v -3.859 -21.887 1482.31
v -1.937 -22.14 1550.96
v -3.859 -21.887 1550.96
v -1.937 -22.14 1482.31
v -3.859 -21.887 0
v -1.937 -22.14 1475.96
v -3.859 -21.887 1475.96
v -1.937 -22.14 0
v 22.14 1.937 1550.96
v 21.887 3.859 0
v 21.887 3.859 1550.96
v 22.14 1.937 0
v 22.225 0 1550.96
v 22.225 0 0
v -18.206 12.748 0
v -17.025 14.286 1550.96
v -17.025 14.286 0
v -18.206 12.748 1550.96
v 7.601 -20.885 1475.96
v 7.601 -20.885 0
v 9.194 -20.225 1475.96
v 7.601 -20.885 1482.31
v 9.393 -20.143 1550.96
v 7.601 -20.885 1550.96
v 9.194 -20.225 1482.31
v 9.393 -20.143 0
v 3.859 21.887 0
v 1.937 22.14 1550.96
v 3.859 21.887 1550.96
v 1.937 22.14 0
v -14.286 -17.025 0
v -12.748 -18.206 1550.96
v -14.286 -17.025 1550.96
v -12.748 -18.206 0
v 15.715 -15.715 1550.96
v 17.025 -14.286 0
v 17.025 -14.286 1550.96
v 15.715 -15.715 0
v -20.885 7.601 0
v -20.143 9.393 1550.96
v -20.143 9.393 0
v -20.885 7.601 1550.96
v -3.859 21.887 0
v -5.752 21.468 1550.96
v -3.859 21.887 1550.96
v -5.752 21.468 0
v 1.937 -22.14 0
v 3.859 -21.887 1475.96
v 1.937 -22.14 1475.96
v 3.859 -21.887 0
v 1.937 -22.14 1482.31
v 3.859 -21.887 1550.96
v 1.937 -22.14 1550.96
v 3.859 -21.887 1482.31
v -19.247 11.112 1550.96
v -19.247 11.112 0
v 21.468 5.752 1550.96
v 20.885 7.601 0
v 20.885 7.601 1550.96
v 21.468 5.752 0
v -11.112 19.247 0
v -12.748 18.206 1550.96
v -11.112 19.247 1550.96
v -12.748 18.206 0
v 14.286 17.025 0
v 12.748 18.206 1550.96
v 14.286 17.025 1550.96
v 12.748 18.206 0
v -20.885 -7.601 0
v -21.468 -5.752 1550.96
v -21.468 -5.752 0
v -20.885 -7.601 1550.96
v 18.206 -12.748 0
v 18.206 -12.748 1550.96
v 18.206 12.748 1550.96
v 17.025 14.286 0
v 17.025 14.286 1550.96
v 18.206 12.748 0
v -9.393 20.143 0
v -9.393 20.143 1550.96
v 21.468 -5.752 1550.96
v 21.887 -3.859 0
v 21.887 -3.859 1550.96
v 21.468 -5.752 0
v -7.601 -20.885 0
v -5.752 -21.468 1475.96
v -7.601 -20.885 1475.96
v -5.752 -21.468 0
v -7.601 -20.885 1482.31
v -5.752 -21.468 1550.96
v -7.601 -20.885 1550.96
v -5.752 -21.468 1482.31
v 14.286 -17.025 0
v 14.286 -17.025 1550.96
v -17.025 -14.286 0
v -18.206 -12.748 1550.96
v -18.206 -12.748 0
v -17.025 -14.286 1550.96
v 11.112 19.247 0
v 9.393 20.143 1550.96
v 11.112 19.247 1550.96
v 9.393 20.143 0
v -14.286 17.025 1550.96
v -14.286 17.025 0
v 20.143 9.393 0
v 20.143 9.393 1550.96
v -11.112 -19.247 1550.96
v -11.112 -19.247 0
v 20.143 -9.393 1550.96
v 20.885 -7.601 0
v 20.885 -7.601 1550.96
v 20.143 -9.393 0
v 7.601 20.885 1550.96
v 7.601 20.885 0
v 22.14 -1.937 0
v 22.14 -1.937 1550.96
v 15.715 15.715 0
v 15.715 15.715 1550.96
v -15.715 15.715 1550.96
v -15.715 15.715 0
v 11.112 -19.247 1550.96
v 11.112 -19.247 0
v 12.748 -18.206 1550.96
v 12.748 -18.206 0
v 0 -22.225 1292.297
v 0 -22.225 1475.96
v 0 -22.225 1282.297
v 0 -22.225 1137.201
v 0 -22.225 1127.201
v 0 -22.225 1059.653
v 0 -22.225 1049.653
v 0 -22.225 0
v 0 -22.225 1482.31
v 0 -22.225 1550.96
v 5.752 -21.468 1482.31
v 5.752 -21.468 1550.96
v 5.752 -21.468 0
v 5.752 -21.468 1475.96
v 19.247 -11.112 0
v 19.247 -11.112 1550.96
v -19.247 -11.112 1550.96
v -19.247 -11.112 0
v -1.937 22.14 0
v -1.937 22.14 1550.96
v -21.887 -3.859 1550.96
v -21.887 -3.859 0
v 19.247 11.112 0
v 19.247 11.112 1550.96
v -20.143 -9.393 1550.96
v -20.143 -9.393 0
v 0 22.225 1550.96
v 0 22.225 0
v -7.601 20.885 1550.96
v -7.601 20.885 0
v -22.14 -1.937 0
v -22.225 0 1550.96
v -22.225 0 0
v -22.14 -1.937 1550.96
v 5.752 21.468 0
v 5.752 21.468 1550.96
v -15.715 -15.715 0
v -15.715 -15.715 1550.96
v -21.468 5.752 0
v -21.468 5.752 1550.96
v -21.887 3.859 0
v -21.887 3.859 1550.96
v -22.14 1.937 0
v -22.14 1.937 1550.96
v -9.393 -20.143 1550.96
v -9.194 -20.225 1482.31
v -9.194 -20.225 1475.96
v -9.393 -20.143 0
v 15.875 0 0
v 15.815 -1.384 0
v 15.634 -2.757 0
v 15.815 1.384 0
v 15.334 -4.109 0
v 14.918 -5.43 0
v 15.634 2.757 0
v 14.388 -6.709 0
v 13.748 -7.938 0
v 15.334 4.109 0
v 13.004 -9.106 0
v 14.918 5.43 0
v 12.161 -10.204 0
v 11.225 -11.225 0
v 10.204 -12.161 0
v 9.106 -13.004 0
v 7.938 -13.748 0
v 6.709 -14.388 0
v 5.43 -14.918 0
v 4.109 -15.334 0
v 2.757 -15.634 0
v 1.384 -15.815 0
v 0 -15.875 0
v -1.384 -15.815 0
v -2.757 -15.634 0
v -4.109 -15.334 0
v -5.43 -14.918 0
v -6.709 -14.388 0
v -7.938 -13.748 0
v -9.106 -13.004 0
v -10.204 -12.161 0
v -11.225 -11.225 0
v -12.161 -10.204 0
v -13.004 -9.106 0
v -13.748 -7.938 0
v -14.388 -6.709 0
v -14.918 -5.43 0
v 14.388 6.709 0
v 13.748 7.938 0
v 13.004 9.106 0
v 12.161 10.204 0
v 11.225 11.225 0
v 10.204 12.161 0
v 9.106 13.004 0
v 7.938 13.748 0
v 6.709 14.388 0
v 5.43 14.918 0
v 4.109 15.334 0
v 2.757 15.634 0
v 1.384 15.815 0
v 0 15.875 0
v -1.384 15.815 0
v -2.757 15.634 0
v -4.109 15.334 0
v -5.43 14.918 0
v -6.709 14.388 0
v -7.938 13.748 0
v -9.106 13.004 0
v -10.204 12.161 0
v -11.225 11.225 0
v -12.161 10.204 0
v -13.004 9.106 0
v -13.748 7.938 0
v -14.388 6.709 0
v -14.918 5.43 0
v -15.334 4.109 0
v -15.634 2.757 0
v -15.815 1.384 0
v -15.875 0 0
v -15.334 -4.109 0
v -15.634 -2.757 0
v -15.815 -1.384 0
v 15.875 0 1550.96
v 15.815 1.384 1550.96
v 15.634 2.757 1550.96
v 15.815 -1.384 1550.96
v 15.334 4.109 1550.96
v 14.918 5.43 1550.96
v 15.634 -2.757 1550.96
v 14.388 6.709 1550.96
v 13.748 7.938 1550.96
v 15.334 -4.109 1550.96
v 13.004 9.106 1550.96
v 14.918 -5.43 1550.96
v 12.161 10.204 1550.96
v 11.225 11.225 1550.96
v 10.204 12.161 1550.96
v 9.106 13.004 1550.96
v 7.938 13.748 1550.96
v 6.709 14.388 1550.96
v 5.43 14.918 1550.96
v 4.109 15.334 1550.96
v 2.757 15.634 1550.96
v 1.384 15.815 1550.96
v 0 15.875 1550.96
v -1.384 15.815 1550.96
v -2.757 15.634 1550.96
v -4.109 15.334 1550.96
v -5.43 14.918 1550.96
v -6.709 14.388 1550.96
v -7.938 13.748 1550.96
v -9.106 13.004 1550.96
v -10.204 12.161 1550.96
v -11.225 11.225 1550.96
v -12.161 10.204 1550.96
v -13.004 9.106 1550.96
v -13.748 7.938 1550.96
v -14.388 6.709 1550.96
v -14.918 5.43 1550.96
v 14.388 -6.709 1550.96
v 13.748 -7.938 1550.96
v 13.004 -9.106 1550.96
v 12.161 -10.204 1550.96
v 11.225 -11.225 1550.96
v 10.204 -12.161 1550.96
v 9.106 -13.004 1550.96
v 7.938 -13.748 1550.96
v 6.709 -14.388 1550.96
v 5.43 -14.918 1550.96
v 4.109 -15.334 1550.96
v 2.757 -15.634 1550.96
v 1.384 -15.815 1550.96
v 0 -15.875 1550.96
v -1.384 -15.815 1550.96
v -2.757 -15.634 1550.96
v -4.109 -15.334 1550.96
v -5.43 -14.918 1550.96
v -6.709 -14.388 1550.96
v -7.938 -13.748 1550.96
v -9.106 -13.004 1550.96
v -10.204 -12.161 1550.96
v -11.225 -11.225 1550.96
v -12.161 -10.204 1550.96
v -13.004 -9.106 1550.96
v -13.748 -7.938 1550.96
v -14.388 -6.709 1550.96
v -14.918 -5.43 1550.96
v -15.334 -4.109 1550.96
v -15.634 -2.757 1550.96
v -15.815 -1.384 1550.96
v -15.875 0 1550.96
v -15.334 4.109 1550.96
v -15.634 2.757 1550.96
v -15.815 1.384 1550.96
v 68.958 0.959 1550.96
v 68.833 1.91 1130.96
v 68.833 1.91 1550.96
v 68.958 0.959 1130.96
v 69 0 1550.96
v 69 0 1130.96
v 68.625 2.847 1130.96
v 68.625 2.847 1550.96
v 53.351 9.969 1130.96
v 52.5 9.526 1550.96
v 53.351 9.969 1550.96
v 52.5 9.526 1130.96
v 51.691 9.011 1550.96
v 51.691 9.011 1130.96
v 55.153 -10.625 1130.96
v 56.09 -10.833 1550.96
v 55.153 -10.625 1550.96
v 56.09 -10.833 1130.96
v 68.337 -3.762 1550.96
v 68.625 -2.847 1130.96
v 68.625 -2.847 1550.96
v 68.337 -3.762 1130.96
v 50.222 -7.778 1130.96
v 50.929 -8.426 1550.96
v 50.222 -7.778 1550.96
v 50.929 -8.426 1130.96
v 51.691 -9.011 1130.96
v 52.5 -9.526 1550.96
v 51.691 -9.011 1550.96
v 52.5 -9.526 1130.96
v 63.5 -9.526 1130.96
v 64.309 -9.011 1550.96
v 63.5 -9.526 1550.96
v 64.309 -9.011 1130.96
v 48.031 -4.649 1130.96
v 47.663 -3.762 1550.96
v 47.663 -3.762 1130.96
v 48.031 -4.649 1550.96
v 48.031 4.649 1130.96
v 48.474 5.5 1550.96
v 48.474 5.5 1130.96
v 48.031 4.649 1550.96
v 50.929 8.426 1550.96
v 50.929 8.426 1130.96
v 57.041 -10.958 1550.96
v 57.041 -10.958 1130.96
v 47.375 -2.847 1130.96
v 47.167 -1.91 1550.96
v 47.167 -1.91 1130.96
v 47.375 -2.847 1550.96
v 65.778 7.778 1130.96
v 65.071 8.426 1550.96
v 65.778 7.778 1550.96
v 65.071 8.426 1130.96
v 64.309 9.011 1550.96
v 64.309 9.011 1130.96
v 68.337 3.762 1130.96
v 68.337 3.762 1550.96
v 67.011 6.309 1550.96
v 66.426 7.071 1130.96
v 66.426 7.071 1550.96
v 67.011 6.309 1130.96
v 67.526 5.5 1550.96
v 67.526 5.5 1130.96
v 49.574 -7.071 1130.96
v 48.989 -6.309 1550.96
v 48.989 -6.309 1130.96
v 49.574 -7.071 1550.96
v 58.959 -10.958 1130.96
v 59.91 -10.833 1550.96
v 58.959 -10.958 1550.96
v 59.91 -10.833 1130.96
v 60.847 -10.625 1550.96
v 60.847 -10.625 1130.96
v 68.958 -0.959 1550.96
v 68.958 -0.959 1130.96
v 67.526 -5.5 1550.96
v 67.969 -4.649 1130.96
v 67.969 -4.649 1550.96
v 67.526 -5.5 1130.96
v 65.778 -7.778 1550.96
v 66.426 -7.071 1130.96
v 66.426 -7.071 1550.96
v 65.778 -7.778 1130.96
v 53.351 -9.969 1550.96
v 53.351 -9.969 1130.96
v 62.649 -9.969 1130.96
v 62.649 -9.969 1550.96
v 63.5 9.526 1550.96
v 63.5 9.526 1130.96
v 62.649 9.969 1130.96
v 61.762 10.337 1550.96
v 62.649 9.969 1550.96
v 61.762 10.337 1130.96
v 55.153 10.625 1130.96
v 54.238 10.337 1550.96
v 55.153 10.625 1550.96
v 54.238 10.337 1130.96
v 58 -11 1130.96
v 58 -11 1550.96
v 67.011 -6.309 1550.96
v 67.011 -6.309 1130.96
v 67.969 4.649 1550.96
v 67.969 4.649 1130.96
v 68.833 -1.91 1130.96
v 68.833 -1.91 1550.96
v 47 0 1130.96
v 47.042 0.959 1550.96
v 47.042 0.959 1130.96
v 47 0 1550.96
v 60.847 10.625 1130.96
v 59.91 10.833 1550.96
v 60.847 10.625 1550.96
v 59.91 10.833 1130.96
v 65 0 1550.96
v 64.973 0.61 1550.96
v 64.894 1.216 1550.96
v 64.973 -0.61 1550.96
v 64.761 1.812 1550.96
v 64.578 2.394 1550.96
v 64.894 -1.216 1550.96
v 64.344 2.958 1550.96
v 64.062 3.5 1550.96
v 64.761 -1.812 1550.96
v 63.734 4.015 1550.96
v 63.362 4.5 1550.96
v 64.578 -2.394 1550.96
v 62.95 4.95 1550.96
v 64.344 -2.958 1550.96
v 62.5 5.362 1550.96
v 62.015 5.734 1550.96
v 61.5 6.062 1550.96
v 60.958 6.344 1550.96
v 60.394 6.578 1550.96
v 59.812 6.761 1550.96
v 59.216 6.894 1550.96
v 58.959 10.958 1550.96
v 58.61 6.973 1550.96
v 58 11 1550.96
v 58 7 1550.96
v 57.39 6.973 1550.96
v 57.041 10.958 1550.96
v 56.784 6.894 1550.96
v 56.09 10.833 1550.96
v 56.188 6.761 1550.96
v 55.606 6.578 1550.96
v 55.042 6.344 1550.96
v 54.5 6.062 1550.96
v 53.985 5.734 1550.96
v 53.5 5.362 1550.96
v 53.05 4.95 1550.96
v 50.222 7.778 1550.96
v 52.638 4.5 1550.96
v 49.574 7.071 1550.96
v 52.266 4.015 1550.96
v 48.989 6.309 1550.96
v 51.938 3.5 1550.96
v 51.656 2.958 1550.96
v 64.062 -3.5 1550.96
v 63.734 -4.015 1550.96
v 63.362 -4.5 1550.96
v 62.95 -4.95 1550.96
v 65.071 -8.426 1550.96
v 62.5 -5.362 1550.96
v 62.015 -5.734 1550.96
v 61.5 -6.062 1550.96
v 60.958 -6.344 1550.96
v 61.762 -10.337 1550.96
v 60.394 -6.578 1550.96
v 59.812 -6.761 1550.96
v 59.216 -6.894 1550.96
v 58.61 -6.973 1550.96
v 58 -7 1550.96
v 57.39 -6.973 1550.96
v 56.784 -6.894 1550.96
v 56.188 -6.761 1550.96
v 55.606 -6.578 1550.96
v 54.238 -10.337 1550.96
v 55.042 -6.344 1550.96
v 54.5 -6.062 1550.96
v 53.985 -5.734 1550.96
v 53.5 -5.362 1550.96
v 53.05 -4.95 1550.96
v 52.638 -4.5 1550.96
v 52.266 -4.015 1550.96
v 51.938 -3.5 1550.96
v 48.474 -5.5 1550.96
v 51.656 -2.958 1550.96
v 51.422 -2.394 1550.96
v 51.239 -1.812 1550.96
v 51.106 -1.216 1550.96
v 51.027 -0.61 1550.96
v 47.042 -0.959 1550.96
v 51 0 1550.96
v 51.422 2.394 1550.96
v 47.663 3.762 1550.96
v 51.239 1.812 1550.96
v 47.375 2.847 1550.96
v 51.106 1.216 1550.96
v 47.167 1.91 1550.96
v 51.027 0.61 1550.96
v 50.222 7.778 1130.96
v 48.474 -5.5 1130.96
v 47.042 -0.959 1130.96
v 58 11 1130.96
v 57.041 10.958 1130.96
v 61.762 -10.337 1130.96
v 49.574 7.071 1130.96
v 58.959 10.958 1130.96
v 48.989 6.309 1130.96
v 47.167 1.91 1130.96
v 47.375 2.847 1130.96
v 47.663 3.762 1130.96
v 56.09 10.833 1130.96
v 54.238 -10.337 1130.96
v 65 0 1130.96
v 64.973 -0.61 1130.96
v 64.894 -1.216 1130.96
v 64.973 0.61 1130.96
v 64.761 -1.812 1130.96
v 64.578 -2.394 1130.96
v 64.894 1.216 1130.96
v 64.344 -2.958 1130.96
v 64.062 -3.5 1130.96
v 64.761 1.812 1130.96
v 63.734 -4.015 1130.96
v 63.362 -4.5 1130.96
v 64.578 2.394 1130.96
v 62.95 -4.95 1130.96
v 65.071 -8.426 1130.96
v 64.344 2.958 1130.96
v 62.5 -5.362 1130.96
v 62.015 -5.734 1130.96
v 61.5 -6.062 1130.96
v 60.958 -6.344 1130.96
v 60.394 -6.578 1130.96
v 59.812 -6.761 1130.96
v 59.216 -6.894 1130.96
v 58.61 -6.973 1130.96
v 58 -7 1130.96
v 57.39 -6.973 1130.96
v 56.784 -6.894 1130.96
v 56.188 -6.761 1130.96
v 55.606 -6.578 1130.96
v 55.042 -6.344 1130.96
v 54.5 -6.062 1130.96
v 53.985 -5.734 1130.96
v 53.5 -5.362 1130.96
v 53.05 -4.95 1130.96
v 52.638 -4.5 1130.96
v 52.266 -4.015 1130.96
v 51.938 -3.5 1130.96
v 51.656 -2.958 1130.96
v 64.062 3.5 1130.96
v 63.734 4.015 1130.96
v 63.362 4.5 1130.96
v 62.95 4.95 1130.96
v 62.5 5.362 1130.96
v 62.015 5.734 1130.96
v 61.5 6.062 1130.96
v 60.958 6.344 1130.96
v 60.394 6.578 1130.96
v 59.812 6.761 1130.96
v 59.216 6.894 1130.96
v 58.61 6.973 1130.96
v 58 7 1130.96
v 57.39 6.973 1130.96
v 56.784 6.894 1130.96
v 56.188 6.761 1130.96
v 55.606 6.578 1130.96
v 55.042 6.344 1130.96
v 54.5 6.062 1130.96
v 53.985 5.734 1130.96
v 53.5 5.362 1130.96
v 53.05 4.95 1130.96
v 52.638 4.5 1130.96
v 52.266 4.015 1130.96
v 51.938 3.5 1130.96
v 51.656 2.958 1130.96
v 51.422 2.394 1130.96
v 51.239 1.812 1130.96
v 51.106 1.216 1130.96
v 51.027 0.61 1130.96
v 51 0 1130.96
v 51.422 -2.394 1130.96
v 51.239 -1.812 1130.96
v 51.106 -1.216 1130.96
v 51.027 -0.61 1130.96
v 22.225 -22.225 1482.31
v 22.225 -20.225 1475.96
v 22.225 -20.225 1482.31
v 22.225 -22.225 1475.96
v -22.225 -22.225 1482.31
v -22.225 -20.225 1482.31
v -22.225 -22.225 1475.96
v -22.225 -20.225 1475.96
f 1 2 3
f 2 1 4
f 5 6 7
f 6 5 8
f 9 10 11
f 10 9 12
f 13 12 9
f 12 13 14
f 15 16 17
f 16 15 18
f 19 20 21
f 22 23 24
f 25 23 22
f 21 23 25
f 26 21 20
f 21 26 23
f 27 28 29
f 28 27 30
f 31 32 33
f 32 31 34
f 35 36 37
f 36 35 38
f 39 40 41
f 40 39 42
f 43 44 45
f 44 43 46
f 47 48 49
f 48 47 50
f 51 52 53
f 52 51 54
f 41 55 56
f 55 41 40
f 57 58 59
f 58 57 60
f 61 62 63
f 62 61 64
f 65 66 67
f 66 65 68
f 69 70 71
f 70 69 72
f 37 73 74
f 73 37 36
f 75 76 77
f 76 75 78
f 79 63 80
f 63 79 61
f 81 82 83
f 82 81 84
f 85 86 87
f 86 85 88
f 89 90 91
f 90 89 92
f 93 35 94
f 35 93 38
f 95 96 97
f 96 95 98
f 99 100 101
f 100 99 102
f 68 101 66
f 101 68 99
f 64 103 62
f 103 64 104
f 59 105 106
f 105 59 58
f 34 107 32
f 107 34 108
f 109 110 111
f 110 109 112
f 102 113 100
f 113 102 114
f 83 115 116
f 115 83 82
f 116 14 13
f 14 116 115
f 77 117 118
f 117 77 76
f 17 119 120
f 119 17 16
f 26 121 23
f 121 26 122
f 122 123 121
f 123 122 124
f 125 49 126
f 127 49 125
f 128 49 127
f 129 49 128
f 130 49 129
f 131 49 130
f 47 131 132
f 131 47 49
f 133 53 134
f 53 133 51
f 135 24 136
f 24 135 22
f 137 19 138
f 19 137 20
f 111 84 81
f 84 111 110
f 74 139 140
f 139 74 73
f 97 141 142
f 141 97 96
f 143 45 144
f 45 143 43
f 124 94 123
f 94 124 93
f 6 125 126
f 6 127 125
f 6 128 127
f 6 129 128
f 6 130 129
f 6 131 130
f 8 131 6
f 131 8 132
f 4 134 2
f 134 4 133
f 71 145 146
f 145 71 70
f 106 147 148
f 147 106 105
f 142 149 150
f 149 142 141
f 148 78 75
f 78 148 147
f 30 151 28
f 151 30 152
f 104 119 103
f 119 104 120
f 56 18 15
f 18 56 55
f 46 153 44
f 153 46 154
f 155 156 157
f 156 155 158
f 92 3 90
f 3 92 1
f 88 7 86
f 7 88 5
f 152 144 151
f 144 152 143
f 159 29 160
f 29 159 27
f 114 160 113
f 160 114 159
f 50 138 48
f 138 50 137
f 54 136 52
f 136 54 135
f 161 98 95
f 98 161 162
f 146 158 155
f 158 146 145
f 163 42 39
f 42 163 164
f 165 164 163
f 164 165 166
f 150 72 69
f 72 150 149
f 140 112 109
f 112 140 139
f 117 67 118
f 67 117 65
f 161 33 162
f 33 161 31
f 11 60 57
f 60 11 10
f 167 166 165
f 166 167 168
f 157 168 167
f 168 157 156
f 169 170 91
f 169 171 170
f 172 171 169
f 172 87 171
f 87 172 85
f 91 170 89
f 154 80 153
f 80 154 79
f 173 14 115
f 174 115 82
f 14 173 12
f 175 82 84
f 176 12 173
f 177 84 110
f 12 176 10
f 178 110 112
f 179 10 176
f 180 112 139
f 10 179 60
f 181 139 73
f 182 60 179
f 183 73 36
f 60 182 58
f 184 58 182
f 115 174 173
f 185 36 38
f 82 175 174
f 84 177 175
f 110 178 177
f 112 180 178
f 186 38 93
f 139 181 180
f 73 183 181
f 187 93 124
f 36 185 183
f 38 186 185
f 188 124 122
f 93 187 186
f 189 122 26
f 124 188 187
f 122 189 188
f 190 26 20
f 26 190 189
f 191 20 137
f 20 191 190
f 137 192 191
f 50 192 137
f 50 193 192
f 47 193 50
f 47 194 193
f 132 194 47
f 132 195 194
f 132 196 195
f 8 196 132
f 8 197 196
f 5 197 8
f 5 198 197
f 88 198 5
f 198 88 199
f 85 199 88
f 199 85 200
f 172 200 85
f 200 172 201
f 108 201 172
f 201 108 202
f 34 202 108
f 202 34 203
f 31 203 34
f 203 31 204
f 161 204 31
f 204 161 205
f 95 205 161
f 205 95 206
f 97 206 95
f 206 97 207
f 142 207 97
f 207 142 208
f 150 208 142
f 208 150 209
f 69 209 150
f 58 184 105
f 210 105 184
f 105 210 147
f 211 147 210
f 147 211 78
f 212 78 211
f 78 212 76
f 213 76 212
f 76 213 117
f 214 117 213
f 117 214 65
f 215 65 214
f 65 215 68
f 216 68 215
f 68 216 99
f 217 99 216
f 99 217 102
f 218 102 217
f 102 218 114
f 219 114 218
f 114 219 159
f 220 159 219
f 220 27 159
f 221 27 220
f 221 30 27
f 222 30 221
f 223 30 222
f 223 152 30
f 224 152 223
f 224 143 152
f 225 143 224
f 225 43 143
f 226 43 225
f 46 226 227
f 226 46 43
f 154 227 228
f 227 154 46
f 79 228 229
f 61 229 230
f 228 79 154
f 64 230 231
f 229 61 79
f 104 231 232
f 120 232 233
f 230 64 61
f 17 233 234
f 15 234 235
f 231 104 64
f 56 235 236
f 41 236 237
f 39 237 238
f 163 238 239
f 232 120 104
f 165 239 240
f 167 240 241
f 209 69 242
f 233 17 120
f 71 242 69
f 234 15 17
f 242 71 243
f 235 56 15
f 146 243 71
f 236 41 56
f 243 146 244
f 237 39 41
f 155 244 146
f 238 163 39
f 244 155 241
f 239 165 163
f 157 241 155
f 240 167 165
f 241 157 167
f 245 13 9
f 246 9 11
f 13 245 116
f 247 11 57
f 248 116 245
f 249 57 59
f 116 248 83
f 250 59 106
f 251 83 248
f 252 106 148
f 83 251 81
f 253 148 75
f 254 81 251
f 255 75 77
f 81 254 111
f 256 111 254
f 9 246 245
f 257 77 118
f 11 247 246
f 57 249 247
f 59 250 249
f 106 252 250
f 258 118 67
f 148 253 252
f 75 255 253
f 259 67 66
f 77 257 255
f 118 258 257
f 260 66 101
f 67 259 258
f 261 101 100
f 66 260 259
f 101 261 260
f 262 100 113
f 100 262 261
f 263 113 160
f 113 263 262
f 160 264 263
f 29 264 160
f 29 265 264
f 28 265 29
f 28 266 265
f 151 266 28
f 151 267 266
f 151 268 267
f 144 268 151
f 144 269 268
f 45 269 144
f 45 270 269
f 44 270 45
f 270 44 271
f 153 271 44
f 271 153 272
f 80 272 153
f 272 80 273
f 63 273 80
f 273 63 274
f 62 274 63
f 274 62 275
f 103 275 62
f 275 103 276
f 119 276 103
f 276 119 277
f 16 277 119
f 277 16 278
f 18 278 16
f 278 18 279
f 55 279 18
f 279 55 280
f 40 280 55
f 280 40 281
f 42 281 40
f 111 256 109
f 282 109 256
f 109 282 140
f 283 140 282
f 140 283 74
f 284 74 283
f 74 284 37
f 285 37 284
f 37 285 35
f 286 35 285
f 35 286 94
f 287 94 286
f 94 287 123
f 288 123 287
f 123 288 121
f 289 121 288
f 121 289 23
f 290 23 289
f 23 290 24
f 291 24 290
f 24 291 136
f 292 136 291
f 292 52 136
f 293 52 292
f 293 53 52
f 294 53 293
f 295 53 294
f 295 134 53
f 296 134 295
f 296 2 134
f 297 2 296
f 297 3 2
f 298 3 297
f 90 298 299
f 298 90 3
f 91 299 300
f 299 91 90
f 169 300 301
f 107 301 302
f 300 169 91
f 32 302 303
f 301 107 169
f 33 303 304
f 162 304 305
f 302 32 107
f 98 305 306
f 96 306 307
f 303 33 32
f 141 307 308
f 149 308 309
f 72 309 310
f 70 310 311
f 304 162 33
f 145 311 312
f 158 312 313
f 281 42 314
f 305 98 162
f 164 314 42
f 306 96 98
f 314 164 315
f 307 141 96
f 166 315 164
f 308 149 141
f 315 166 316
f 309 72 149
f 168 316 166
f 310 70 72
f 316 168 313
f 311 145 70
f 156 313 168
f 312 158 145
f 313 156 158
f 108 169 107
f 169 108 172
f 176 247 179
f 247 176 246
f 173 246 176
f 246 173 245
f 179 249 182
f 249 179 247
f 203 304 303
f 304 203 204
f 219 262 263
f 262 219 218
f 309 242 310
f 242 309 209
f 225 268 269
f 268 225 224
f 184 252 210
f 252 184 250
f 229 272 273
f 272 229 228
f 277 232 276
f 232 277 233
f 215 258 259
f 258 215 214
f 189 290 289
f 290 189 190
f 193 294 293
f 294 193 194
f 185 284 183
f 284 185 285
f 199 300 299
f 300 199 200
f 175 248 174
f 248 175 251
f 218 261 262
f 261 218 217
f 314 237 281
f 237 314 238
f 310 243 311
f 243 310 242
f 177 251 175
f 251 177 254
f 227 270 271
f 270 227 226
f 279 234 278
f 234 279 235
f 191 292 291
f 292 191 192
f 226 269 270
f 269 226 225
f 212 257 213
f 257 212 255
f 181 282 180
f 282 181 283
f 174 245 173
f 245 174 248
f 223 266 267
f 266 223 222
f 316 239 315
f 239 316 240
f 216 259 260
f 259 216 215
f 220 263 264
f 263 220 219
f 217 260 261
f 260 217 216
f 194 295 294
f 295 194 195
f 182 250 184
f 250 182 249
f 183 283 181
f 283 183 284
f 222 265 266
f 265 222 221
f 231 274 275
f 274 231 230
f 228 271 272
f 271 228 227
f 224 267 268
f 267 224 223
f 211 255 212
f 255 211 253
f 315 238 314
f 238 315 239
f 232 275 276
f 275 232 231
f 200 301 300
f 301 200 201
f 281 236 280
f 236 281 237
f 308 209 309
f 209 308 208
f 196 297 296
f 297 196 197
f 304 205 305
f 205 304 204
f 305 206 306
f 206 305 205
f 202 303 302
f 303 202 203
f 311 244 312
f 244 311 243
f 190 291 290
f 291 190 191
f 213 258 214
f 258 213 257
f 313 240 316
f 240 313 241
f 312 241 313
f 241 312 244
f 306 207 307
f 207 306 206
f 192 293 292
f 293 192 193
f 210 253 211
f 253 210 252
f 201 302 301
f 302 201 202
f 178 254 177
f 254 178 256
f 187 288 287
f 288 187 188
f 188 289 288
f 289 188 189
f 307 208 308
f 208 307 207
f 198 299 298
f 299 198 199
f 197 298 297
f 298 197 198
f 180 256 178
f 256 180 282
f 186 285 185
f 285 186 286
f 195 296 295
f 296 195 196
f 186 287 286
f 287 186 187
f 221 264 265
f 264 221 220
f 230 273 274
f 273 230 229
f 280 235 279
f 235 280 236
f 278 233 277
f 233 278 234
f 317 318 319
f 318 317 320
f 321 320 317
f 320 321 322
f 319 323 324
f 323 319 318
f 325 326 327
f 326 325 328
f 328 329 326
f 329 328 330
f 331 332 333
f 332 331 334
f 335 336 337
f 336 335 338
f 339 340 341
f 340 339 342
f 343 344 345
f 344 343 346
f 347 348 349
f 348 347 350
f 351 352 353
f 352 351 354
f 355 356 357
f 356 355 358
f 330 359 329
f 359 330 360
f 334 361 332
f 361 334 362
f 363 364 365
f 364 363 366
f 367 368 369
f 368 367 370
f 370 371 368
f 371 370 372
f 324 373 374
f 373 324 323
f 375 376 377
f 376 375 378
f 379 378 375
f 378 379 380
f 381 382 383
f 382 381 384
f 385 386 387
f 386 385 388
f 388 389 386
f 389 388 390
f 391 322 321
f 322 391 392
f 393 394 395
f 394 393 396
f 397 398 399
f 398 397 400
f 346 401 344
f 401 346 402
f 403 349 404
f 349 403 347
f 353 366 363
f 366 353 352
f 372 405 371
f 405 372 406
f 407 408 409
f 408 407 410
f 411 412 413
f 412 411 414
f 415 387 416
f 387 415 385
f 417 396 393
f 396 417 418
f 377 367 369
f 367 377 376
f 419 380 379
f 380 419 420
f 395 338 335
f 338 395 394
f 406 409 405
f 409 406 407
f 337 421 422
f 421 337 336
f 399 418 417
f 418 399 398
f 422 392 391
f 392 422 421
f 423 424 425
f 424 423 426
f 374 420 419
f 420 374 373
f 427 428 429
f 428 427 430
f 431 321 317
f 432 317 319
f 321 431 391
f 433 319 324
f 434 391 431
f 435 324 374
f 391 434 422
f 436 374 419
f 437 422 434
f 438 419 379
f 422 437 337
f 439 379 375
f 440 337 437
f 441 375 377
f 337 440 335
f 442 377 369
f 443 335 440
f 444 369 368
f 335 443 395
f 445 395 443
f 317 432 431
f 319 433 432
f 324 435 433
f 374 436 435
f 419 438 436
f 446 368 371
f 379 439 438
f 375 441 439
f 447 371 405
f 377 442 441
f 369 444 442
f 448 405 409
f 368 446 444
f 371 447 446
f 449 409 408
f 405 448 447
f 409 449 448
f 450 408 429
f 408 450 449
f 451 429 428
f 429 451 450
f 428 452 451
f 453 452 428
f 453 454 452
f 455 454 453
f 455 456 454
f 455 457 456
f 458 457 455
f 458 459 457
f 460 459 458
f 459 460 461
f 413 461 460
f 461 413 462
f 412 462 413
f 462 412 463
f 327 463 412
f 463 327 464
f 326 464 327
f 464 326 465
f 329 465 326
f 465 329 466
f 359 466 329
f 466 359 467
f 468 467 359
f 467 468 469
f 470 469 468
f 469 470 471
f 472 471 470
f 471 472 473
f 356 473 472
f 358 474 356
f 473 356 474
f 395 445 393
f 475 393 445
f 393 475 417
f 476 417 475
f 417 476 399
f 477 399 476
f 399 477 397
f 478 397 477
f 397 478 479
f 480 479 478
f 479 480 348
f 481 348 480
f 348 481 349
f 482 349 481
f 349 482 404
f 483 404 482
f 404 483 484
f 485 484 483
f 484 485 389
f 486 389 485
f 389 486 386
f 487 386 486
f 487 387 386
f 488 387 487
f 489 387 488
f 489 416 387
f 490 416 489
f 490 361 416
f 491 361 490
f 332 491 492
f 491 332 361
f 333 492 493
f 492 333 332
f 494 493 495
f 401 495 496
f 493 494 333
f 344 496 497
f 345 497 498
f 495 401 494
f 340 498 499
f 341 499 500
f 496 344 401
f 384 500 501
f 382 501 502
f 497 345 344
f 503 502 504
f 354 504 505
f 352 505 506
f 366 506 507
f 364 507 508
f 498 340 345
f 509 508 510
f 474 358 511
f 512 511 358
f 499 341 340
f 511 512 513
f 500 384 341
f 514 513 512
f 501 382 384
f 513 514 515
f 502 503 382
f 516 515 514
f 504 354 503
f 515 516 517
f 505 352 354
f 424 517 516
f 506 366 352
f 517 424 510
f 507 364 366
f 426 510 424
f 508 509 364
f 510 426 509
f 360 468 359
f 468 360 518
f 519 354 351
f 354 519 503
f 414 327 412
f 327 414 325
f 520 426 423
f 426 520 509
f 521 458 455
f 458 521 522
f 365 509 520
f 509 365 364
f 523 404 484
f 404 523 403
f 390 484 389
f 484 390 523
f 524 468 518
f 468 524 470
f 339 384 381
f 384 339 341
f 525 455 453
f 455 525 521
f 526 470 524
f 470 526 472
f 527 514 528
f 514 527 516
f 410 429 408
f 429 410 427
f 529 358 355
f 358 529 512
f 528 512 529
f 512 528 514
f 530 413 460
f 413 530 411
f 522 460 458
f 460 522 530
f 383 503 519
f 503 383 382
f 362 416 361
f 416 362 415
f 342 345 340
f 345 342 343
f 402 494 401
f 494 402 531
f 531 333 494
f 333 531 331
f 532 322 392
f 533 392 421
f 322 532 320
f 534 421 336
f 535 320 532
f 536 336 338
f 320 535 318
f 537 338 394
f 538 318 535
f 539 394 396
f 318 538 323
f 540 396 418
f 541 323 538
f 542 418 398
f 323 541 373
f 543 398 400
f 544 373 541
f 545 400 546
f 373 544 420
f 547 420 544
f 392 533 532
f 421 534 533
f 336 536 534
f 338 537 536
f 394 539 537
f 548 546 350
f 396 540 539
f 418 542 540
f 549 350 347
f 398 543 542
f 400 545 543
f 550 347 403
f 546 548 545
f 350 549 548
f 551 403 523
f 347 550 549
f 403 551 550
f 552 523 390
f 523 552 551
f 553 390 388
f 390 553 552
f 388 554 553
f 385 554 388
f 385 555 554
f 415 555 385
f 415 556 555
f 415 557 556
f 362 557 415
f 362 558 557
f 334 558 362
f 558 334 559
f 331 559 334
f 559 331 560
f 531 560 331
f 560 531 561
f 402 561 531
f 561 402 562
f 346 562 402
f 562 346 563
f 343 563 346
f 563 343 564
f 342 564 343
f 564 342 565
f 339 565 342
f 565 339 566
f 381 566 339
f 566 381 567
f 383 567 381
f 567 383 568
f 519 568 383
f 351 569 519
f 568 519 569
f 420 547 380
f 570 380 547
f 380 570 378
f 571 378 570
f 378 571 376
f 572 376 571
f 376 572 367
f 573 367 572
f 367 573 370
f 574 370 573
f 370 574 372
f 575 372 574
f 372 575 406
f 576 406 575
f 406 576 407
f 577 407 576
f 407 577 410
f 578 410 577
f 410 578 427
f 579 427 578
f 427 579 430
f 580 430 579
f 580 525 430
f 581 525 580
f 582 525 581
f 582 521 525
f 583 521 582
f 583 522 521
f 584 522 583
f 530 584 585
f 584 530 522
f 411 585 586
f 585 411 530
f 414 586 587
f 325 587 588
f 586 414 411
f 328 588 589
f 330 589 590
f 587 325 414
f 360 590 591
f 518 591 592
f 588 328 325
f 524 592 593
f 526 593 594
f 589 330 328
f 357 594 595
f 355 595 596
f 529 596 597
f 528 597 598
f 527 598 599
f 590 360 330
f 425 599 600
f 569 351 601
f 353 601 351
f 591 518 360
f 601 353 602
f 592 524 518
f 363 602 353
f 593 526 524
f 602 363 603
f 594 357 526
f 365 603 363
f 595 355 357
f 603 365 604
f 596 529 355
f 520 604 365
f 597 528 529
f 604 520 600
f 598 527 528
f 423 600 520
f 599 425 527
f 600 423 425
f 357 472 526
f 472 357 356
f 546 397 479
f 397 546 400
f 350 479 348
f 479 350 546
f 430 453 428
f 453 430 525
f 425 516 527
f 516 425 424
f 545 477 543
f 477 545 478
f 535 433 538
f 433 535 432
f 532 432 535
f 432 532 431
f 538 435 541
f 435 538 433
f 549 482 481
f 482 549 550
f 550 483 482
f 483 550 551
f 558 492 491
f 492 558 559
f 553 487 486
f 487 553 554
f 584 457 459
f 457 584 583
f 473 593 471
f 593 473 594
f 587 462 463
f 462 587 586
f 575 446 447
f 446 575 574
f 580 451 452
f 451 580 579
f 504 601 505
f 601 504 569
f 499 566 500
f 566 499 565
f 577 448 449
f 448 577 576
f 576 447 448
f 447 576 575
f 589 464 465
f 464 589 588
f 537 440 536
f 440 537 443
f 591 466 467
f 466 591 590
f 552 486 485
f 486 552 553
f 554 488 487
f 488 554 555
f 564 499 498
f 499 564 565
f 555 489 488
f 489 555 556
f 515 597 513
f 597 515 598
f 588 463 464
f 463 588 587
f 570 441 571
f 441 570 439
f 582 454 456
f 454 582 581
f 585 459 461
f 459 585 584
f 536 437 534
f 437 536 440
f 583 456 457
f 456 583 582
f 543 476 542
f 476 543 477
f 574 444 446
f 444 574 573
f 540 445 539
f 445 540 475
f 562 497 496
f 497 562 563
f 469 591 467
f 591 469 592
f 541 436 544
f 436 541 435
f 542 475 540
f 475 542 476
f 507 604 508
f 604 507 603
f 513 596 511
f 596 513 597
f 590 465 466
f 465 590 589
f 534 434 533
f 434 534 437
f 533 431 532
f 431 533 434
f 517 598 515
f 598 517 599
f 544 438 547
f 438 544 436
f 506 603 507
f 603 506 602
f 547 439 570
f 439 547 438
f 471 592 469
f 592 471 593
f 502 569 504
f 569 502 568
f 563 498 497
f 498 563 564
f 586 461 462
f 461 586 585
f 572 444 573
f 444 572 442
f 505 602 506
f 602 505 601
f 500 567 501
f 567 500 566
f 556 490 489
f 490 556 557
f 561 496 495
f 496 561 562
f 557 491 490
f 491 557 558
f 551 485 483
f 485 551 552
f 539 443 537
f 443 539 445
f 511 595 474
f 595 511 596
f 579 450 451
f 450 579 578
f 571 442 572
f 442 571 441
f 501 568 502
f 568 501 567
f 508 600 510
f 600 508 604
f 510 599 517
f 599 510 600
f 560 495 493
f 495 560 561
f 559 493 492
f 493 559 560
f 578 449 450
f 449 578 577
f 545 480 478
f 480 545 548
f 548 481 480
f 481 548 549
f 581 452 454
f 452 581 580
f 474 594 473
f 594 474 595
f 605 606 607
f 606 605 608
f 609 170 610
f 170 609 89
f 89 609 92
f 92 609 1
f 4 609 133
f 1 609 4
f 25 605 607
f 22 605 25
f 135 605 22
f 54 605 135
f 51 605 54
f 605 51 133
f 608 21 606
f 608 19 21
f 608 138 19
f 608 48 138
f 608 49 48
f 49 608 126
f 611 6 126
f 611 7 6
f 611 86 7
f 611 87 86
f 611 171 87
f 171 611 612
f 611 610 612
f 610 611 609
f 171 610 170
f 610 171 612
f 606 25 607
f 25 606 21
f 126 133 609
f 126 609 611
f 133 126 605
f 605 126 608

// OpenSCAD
// Fujara V5 candidate OpenSCAD starter.
// Review scaffold only: verify against SolidWorks/design-table authority before shop use.

$fn = 72;

// Source refs:
// - family-spec.csv member FUJ-A2-STUDY
// - sw-reference/Fujara-SW-Design-Table.csv
// - CAD/fujara-body/G2Fujara_Assembly.SLDASM_dimensions.csv

target_note = "A2";
target_hz = 110.00;
temperature_c = 20;

// Validator-compatible first-pass open-open length at 20 C.
main_bore_length_mm = 1550.96;
main_bore_id_mm = 31.75;
wall_thickness_mm = 6.35;
outer_diameter_mm = main_bore_id_mm + 2 * wall_thickness_mm;

// Traditional fujara three-hole layout rule measured from the foot end.
hole1_from_foot_mm = main_bore_length_mm * 0.83;
hole2_from_foot_mm = main_bore_length_mm * 0.73;
hole3_from_foot_mm = main_bore_length_mm * 0.68;
hole_diameter_mm = 10;

// Measurement-required delivery/voicing placeholders.
side_tube_center_offset_mm = 58;
side_tube_od_mm = 22;
side_tube_id_mm = 14;
side_tube_length_mm = 420;
flue_width_mm = 12;
sound_hole_length_mm = 6.35;

module main_bore_shell() {
  difference() {
    cylinder(h = main_bore_length_mm, d = outer_diameter_mm);
    translate([0, 0, -1]) cylinder(h = main_bore_length_mm + 2, d = main_bore_id_mm);
  }
}

module tone_hole(z_pos) {
  translate([0, -outer_diameter_mm / 2, z_pos])
    rotate([90, 0, 0])
      cylinder(h = outer_diameter_mm, d = hole_diameter_mm);
}

module side_air_tube() {
  translate([side_tube_center_offset_mm, 0, main_bore_length_mm - side_tube_length_mm])
    difference() {
      cylinder(h = side_tube_length_mm, d = side_tube_od_mm);
      translate([0, 0, -1]) cylinder(h = side_tube_length_mm + 2, d = side_tube_id_mm);
    }
}

module labium_review_marker() {
  translate([-outer_diameter_mm / 2, -outer_diameter_mm / 2, main_bore_length_mm - 75])
    cube([outer_diameter_mm, 2, sound_hole_length_mm]);
}

difference() {
  main_bore_shell();
  tone_hole(hole1_from_foot_mm);
  tone_hole(hole2_from_foot_mm);
  tone_hole(hole3_from_foot_mm);
}

side_air_tube();
labium_review_marker();
